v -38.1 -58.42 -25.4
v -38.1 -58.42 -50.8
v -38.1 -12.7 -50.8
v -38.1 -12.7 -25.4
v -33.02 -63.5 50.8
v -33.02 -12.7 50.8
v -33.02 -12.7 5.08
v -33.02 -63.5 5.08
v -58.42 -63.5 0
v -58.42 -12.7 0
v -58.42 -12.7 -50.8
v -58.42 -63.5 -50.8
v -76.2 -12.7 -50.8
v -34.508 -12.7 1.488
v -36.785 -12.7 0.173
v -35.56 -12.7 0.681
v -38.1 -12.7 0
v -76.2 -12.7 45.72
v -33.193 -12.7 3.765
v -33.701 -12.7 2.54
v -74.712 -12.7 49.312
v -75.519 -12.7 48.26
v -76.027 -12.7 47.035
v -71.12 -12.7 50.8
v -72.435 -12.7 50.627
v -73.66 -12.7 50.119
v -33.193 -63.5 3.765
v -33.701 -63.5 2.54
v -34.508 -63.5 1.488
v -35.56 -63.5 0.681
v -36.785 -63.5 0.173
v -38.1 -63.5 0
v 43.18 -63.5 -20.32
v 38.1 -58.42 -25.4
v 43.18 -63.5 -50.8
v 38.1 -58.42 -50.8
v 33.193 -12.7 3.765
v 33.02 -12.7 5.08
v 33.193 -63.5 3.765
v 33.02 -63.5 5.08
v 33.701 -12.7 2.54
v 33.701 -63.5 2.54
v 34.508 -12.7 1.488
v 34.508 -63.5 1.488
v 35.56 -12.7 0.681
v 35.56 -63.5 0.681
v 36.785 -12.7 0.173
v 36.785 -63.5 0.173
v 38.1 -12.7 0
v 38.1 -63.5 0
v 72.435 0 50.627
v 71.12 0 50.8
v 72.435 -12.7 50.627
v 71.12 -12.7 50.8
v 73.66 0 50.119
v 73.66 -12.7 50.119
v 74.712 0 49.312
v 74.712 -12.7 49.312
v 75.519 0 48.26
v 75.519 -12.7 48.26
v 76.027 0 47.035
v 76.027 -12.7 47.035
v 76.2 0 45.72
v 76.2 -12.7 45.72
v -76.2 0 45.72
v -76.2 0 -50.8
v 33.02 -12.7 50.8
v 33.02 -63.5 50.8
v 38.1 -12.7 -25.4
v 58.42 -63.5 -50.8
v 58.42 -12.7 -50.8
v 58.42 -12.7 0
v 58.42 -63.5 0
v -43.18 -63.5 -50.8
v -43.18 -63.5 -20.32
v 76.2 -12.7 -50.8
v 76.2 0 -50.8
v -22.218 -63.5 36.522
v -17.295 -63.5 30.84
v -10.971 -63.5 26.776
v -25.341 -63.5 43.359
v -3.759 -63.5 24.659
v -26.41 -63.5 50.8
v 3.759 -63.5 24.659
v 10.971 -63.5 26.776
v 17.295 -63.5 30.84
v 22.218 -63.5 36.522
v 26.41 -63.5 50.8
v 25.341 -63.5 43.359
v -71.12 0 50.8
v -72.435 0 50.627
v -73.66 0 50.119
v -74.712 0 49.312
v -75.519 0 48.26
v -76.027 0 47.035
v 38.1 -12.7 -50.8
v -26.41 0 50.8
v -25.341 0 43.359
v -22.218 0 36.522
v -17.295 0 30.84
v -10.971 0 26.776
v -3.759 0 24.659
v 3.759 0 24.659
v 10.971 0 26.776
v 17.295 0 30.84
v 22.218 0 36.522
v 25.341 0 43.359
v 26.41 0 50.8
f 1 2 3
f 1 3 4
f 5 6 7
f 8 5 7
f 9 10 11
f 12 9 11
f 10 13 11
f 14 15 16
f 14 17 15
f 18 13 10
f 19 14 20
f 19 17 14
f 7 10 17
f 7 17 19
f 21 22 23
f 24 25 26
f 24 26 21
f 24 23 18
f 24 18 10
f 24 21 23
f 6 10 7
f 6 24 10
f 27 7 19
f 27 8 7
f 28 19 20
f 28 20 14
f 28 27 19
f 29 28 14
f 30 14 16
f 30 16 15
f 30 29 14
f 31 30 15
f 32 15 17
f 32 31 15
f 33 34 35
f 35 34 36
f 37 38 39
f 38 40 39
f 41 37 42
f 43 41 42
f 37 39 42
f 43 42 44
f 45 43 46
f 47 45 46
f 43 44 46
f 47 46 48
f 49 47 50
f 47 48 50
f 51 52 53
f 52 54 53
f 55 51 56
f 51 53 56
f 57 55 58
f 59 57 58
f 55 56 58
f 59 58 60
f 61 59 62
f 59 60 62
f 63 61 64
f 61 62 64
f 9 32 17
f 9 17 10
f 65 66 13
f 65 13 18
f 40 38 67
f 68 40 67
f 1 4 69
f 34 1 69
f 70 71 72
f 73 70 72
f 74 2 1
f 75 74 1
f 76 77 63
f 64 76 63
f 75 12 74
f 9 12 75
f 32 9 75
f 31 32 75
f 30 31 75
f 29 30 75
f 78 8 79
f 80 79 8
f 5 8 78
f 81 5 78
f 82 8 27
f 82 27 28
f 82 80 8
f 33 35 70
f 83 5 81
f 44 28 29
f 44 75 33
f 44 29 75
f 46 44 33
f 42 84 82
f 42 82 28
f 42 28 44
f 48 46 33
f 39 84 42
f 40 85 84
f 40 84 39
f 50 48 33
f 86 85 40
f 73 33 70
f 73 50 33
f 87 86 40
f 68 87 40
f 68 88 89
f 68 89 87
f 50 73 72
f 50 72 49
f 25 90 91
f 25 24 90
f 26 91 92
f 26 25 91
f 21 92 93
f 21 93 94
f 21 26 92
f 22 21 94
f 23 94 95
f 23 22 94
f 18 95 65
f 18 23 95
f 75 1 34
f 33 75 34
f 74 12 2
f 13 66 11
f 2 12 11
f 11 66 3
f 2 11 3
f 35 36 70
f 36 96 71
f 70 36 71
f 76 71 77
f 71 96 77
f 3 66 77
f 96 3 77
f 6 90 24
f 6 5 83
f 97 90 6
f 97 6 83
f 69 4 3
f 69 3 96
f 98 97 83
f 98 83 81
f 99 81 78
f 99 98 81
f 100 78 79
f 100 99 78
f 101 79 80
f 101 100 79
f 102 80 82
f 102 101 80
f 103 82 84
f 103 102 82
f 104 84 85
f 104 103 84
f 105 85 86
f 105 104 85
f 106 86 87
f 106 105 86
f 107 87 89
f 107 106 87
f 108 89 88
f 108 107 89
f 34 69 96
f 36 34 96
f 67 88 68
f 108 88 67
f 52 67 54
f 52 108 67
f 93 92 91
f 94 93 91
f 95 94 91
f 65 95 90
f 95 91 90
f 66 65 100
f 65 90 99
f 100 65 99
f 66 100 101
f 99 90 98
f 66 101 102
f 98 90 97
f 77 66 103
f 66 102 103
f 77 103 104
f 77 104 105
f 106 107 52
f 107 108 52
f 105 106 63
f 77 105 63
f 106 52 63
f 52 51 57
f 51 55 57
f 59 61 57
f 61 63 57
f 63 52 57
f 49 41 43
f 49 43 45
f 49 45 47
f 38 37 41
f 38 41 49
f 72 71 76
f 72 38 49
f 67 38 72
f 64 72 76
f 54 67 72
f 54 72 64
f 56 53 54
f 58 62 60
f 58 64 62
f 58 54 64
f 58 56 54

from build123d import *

# Parameters (mm, degrees)
F0_W     = 152.4
F0_H     = 101.6
F1_DEPTH = 12.7
F3_DEPTH = 50.8
F4_R     = 5.08
F5_R     = 5.08
F6_R     = 5.08
F7_R     = 5.08
F8_R     = 26.410315
F9_DEPTH = 63.501
F10_SIZE = 5.08


with BuildPart() as f1:
    # F0 (on Front) → F1 (new body)
    with BuildSketch(Plane.XZ):
        Rectangle(F0_W, F0_H)
    extrude(amount=F1_DEPTH)

    # F2 (on face) → F3 (join)
    with BuildSketch(Plane.XZ.offset(12.7)):
        Polygon((33.02, 50.8), (-33.02, 50.8), (-33.02, 0), (-58.42, 0), (-58.42, -50.8), (-38.1, -50.8), (-38.1, -25.4), (38.1, -25.4), (38.1, -50.8), (58.42, -50.8), (58.42, 0), (33.02, 0), align=None)
    extrude(amount=F3_DEPTH)

    # F4
    f4_edges = [f1.edges().sort_by_distance(p)[0] for p in [
        (76.2, -6.35, 50.8),
    ]]
    fillet(f4_edges, radius=F4_R)

    # F5
    f5_edges = [f1.edges().sort_by_distance(p)[0] for p in [
        (-76.2, -6.35, 50.8),
    ]]
    fillet(f5_edges, radius=F5_R)

    # F6
    f6_edges = [f1.edges().sort_by_distance(p)[0] for p in [
        (33.02, -38.1, 0),
    ]]
    fillet(f6_edges, radius=F6_R)

    # F7
    f7_edges = [f1.edges().sort_by_distance(p)[0] for p in [
        (-33.02, -38.1, 0),
    ]]
    fillet(f7_edges, radius=F7_R)

    # F8 (on Front) → F9 (cut, through all)
    with BuildSketch(Plane.XZ):
        with Locations((0, 50.8)):
            Circle(F8_R)
    extrude(amount=F9_DEPTH, mode=Mode.SUBTRACT)

    # F10
    f10_edges = [f1.edges().sort_by_distance(p)[0] for p in [
        (0, -63.5, -25.4),
        (-38.1, -63.5, -38.1),
        (38.1, -63.5, -38.1),
    ]]
    chamfer(f10_edges, length=F10_SIZE)


solid = f1.part
